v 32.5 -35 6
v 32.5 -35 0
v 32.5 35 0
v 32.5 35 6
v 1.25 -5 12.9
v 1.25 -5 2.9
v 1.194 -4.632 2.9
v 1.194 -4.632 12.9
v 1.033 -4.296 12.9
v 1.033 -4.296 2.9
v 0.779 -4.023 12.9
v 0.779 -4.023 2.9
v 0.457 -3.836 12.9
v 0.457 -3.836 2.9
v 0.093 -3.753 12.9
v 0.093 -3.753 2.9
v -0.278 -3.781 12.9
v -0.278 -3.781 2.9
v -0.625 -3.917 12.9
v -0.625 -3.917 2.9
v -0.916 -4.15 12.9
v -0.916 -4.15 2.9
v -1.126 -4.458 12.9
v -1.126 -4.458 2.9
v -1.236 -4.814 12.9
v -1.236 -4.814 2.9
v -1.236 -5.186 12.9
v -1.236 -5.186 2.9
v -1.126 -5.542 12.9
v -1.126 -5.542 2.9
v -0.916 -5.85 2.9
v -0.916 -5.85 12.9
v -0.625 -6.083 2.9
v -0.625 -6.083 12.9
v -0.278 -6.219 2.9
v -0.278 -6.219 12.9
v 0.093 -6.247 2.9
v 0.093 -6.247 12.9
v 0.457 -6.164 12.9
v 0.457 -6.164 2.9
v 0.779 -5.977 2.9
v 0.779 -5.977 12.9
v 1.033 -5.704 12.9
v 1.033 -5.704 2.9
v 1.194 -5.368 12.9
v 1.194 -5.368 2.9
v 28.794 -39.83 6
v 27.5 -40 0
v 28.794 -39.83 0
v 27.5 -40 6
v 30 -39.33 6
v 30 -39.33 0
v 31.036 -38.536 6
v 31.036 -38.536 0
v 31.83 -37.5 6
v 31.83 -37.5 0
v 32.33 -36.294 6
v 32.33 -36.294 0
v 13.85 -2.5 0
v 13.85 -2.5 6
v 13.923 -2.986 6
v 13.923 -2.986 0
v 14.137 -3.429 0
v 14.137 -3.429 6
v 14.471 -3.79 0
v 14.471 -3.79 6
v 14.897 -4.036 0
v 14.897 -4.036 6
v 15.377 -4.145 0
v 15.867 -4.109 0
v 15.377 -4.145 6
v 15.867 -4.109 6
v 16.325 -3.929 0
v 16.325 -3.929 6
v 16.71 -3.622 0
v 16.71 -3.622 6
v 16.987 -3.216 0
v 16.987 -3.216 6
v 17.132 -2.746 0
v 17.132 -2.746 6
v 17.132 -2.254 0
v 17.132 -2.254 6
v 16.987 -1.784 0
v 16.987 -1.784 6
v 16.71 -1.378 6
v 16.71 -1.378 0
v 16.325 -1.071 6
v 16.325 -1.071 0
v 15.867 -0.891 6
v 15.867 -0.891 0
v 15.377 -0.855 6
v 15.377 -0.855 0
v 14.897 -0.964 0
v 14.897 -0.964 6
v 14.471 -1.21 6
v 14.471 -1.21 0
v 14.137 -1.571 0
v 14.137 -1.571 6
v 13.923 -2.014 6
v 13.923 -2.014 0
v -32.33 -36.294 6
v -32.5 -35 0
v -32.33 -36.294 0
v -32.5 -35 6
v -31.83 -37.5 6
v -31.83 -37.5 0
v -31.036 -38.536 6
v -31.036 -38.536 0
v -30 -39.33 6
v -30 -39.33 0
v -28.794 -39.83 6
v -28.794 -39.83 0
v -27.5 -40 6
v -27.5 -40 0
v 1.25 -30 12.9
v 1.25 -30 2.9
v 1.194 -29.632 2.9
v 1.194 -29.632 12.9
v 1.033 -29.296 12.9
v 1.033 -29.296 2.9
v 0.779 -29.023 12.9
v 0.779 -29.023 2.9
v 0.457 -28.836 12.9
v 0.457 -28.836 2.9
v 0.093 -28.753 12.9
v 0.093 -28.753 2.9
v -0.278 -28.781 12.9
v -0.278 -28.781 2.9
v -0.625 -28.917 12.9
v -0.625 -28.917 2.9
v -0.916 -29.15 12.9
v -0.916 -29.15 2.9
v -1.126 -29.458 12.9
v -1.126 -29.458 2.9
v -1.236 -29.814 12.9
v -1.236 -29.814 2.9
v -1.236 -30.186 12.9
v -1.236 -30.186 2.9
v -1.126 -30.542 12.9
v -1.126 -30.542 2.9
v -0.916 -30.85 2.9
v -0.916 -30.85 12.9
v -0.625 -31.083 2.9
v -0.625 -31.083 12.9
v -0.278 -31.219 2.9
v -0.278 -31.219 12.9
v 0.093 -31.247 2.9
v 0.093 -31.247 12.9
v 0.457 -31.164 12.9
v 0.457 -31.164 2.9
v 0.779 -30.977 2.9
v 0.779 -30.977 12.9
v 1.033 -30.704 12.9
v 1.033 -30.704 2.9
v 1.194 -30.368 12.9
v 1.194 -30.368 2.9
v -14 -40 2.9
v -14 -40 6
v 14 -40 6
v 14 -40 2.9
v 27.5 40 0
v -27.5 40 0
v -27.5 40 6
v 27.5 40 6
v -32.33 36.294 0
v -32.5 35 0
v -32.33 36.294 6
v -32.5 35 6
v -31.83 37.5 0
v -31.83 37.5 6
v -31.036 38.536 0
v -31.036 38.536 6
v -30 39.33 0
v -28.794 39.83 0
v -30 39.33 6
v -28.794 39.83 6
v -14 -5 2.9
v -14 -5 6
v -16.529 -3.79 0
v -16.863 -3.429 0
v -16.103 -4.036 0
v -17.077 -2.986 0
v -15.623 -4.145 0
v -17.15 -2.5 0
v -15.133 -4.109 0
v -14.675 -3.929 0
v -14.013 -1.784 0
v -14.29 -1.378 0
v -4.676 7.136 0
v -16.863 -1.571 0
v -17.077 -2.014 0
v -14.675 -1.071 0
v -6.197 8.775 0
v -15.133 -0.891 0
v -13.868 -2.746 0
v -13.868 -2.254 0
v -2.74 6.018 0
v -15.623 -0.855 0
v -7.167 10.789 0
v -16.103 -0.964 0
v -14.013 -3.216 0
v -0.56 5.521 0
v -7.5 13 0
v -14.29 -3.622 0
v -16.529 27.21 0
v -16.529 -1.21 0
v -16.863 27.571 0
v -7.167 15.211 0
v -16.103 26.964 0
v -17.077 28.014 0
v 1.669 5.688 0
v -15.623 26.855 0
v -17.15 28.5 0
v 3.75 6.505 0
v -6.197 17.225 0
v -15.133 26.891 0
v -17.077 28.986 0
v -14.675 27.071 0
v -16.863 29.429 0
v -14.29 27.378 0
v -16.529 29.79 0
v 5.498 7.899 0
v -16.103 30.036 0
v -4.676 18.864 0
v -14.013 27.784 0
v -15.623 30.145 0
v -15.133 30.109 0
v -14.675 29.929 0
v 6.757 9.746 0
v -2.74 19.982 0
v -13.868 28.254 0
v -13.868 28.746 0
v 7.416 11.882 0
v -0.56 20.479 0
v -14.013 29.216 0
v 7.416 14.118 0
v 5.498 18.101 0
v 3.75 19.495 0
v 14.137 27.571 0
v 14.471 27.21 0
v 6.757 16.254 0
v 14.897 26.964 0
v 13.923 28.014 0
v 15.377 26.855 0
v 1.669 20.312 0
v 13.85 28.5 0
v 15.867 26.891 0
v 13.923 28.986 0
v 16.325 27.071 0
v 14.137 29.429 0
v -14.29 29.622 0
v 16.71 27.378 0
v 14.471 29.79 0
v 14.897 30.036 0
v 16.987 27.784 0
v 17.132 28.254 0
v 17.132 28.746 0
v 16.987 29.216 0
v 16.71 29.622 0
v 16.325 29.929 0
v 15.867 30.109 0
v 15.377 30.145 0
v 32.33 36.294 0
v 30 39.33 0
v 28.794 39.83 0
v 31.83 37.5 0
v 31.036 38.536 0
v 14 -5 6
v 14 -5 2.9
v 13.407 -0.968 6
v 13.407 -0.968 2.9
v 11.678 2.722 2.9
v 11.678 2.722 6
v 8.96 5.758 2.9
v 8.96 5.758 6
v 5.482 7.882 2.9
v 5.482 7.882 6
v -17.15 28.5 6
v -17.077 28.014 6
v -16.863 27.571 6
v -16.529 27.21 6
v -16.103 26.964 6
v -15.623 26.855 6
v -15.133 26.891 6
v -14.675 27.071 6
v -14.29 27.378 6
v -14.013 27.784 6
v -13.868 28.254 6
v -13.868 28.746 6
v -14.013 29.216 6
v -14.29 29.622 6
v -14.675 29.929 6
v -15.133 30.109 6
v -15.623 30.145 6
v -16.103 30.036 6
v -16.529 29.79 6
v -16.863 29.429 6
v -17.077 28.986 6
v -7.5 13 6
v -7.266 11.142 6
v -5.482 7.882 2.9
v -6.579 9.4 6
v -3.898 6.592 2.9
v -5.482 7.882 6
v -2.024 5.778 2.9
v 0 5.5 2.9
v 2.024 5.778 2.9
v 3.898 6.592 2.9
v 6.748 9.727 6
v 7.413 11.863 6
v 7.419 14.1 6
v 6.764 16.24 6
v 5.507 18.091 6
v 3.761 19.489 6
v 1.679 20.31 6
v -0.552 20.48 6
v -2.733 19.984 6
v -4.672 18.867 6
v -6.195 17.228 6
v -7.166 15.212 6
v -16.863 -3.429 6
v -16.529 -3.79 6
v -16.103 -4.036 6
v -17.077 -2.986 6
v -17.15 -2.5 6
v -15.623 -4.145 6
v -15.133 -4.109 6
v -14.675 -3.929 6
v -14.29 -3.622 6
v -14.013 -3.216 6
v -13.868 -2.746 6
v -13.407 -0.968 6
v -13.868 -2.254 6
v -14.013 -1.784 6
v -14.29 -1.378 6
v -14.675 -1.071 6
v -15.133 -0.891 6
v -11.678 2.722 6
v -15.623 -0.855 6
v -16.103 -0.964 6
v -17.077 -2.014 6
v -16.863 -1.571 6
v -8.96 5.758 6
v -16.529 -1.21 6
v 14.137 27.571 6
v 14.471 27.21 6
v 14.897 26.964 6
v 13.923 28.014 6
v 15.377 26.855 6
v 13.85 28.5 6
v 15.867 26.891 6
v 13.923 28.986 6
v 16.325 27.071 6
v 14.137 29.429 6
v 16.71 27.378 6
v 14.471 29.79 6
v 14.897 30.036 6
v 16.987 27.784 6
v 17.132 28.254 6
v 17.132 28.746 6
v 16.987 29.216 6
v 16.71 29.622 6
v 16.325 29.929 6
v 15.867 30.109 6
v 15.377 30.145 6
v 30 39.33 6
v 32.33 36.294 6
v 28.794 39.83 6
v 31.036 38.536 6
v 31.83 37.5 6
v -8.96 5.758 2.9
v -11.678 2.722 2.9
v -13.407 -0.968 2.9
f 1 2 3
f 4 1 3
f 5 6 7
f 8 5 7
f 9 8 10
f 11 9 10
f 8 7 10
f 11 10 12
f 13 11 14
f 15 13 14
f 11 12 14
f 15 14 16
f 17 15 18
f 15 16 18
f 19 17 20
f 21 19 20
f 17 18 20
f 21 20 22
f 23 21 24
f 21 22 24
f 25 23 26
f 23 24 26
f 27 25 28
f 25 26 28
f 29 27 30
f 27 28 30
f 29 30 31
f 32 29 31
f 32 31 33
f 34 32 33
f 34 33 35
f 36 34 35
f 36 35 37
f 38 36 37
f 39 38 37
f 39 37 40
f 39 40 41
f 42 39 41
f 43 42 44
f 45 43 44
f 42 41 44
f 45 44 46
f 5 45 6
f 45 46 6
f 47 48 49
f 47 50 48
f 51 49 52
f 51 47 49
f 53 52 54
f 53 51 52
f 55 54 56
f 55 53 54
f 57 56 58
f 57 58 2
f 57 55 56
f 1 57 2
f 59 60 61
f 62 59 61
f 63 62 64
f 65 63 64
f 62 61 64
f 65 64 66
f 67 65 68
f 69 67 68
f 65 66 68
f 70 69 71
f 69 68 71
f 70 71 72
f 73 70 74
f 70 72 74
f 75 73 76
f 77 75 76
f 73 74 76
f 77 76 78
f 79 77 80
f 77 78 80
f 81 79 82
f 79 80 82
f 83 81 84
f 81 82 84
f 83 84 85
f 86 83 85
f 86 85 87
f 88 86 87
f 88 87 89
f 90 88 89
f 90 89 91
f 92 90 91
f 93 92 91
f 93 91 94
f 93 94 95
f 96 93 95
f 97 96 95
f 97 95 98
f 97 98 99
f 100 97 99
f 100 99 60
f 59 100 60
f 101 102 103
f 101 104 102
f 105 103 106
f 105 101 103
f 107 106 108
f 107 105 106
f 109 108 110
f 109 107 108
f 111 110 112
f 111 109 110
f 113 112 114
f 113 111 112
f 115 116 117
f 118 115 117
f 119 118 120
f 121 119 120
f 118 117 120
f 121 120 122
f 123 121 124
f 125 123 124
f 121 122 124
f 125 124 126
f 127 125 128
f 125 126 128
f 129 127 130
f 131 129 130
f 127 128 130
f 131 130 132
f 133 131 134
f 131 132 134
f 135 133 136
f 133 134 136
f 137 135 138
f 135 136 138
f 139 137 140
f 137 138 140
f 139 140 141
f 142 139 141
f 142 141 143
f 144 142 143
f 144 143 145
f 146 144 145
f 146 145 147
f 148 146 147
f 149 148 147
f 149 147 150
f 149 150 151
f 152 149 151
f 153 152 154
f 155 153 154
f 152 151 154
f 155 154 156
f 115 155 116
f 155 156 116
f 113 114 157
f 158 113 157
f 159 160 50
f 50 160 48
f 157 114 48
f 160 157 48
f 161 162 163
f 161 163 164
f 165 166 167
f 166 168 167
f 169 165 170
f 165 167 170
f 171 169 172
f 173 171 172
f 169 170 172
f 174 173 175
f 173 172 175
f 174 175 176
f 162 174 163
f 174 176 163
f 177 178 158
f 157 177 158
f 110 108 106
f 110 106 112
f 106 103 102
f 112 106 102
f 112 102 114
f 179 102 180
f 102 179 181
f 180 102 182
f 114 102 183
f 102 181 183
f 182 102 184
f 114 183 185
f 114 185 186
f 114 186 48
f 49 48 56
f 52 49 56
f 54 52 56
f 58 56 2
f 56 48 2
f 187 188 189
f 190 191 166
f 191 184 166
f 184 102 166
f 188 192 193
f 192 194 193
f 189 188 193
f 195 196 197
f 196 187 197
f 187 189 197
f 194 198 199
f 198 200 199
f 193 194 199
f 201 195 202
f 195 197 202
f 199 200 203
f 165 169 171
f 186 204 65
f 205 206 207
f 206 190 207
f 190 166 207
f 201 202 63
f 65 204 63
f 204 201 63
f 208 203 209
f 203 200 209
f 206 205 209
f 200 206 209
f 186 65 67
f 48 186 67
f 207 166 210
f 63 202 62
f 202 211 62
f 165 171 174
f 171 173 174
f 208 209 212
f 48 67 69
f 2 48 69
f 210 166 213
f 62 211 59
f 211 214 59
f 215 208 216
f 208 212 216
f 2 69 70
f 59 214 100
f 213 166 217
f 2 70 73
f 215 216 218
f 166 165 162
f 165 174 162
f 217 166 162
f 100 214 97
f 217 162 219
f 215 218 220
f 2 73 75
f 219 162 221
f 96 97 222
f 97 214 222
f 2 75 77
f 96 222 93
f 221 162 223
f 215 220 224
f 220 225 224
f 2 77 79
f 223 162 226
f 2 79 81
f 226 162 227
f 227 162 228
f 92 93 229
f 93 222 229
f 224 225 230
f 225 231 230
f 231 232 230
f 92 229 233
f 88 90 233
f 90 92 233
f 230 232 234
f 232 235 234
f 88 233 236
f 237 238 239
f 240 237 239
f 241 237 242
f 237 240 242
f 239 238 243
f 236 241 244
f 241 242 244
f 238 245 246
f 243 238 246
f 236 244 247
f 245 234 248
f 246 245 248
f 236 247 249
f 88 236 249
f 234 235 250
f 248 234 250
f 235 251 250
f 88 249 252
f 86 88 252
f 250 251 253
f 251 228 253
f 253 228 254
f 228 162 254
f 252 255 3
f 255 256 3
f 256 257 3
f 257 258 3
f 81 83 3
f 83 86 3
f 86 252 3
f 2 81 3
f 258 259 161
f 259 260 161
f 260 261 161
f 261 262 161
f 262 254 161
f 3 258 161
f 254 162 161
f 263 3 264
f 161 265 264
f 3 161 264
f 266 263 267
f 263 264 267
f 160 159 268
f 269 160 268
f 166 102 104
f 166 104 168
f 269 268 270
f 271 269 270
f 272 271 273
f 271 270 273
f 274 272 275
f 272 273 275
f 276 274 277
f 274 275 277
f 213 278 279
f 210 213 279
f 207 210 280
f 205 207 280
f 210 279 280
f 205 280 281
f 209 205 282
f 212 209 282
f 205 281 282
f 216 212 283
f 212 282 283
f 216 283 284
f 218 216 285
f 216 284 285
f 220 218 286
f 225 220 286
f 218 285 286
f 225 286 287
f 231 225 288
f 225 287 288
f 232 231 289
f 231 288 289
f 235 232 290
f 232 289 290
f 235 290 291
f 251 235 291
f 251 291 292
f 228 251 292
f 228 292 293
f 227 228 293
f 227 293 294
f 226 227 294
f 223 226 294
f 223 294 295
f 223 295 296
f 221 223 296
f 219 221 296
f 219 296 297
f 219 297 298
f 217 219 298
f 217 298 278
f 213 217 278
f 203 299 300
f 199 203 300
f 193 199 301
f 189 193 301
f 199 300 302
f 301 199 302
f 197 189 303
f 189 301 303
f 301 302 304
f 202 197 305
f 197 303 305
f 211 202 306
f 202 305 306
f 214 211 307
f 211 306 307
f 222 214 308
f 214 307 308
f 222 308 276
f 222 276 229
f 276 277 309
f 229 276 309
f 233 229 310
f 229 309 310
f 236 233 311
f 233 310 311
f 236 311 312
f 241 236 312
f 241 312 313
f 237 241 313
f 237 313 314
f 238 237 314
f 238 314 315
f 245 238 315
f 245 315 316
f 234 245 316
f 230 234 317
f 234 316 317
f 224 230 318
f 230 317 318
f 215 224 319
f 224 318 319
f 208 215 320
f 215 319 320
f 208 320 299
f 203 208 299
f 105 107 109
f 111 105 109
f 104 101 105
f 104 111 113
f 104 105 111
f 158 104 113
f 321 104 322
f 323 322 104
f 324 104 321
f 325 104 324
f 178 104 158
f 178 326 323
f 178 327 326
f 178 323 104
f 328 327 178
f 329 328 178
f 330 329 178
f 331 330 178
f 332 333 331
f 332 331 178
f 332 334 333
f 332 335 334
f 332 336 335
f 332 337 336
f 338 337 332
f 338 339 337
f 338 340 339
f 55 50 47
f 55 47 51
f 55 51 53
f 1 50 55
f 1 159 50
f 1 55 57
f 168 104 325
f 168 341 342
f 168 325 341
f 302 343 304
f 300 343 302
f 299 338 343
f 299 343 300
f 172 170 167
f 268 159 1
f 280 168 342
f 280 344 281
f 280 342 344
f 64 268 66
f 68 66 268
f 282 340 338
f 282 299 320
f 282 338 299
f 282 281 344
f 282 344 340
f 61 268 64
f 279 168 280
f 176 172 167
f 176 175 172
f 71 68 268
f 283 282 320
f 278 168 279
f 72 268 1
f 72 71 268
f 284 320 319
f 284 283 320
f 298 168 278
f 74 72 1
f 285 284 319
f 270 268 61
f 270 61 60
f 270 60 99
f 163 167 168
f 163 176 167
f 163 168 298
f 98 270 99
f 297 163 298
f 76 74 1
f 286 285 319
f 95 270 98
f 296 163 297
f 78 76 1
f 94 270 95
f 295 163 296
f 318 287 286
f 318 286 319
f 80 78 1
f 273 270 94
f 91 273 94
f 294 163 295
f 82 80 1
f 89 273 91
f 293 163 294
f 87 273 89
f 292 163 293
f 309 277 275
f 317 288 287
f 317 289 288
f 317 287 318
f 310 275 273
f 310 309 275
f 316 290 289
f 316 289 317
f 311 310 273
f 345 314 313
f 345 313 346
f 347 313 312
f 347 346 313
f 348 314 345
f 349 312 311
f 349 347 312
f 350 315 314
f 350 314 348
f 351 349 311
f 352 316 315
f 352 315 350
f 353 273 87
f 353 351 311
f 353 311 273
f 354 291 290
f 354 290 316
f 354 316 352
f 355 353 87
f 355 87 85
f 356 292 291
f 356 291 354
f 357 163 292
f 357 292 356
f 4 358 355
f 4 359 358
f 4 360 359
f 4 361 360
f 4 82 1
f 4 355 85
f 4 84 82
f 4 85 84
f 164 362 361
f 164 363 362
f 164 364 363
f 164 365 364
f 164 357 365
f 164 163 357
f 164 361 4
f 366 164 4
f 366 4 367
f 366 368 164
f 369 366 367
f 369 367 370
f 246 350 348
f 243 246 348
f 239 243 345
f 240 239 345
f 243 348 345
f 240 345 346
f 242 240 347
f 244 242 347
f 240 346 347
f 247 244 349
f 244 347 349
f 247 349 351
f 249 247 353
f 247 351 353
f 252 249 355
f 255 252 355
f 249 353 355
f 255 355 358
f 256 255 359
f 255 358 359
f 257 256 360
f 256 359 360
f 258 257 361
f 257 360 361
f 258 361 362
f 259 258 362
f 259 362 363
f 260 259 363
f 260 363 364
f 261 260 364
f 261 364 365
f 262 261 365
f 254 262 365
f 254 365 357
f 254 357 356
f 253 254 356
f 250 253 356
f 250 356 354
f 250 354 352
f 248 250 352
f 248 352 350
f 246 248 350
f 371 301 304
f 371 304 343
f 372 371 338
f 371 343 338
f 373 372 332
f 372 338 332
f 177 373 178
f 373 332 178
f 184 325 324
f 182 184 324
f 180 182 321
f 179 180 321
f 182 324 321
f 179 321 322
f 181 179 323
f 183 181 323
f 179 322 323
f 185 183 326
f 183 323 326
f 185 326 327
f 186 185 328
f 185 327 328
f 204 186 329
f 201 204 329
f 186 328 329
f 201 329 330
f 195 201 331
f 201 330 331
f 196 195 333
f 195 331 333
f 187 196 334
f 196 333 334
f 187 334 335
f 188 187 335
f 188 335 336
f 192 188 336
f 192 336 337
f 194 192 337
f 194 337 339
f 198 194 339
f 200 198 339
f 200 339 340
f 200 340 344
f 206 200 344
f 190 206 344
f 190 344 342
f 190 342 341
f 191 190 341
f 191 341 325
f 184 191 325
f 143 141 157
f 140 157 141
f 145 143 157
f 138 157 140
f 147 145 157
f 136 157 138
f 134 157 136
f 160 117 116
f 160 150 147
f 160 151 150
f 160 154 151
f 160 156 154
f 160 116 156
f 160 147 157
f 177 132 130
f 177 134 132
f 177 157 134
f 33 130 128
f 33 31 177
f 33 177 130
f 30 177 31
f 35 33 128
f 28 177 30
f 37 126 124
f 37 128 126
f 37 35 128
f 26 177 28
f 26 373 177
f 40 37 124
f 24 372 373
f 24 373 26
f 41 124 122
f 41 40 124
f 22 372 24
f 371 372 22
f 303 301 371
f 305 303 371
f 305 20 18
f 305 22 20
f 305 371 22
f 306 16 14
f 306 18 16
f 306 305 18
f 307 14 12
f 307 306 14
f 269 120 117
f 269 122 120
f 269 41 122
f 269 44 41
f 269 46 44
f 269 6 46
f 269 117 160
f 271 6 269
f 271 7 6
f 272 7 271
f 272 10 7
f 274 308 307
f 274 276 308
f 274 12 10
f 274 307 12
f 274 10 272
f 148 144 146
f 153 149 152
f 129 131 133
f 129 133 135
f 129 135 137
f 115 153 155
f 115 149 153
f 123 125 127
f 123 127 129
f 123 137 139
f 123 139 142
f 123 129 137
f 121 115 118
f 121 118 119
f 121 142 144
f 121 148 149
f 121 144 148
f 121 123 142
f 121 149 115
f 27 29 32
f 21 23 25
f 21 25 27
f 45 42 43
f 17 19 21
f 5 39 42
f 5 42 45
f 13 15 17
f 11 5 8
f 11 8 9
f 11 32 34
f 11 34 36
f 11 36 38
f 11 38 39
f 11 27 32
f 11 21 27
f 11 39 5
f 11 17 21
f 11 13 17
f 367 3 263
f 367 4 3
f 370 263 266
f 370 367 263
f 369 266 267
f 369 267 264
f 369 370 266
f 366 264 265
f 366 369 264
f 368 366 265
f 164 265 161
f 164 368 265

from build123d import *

# Parameters (mm, degrees)
F0_W     = 65
F0_H     = 80
F1_DEPTH = 6
F2_R     = 5
F4_DEPTH = 3.1
F5_R     = 1.25
F6_DEPTH = 10
F8_D     = 15
F9_D     = 3.3


with BuildPart() as f1:
    # F0 (on Top) → F1 (new body)
    with BuildSketch(Plane.XY):
        Rectangle(F0_W, F0_H)
    extrude(amount=F1_DEPTH)

    # F2
    f2_edges = [f1.edges().sort_by_distance(p)[0] for p in [
        (32.5, -40, 3),
        (32.5, 40, 3),
        (-32.5, 40, 3),
        (-32.5, -40, 3),
    ]]
    fillet(f2_edges, radius=F2_R)

    # F3 (on face) → F4 (cut)
    with BuildSketch(Plane.XY.offset(6)):
        with BuildLine():
            Line((14, -40), (14, -5))
            ThreePointArc((14, -5), (0, 9), (-14, -5))
            Line((-14, -5), (-14, -40))
            Line((-14, -40), (14, -40))
        make_face()
    extrude(amount=-F4_DEPTH, mode=Mode.SUBTRACT)

    # F5 (on face) → F6 (join)
    with BuildSketch(Plane.XY.offset(2.9)):
        with Locations((0, -5)):
            Circle(F5_R)
        with Locations((0, -30)):
            Circle(F5_R)
    extrude(amount=F6_DEPTH)

    # F8 (through all)
    with Locations(Plane(origin=(0, 0, 0), x_dir=(1, 0, 0), z_dir=(0, 0, -1))):
        with Locations((0, -13)):
            Hole(F8_D / 2)

    # F9 (through all)
    with Locations(Plane(origin=(0, 0, 0), x_dir=(1, 0, 0), z_dir=(0, 0, -1))):
        with Locations((15.5, -28.5), (15.5, 2.5), (-15.5, 2.5), (-15.5, -28.5)):
            Hole(F9_D / 2)


solid = f1.part
